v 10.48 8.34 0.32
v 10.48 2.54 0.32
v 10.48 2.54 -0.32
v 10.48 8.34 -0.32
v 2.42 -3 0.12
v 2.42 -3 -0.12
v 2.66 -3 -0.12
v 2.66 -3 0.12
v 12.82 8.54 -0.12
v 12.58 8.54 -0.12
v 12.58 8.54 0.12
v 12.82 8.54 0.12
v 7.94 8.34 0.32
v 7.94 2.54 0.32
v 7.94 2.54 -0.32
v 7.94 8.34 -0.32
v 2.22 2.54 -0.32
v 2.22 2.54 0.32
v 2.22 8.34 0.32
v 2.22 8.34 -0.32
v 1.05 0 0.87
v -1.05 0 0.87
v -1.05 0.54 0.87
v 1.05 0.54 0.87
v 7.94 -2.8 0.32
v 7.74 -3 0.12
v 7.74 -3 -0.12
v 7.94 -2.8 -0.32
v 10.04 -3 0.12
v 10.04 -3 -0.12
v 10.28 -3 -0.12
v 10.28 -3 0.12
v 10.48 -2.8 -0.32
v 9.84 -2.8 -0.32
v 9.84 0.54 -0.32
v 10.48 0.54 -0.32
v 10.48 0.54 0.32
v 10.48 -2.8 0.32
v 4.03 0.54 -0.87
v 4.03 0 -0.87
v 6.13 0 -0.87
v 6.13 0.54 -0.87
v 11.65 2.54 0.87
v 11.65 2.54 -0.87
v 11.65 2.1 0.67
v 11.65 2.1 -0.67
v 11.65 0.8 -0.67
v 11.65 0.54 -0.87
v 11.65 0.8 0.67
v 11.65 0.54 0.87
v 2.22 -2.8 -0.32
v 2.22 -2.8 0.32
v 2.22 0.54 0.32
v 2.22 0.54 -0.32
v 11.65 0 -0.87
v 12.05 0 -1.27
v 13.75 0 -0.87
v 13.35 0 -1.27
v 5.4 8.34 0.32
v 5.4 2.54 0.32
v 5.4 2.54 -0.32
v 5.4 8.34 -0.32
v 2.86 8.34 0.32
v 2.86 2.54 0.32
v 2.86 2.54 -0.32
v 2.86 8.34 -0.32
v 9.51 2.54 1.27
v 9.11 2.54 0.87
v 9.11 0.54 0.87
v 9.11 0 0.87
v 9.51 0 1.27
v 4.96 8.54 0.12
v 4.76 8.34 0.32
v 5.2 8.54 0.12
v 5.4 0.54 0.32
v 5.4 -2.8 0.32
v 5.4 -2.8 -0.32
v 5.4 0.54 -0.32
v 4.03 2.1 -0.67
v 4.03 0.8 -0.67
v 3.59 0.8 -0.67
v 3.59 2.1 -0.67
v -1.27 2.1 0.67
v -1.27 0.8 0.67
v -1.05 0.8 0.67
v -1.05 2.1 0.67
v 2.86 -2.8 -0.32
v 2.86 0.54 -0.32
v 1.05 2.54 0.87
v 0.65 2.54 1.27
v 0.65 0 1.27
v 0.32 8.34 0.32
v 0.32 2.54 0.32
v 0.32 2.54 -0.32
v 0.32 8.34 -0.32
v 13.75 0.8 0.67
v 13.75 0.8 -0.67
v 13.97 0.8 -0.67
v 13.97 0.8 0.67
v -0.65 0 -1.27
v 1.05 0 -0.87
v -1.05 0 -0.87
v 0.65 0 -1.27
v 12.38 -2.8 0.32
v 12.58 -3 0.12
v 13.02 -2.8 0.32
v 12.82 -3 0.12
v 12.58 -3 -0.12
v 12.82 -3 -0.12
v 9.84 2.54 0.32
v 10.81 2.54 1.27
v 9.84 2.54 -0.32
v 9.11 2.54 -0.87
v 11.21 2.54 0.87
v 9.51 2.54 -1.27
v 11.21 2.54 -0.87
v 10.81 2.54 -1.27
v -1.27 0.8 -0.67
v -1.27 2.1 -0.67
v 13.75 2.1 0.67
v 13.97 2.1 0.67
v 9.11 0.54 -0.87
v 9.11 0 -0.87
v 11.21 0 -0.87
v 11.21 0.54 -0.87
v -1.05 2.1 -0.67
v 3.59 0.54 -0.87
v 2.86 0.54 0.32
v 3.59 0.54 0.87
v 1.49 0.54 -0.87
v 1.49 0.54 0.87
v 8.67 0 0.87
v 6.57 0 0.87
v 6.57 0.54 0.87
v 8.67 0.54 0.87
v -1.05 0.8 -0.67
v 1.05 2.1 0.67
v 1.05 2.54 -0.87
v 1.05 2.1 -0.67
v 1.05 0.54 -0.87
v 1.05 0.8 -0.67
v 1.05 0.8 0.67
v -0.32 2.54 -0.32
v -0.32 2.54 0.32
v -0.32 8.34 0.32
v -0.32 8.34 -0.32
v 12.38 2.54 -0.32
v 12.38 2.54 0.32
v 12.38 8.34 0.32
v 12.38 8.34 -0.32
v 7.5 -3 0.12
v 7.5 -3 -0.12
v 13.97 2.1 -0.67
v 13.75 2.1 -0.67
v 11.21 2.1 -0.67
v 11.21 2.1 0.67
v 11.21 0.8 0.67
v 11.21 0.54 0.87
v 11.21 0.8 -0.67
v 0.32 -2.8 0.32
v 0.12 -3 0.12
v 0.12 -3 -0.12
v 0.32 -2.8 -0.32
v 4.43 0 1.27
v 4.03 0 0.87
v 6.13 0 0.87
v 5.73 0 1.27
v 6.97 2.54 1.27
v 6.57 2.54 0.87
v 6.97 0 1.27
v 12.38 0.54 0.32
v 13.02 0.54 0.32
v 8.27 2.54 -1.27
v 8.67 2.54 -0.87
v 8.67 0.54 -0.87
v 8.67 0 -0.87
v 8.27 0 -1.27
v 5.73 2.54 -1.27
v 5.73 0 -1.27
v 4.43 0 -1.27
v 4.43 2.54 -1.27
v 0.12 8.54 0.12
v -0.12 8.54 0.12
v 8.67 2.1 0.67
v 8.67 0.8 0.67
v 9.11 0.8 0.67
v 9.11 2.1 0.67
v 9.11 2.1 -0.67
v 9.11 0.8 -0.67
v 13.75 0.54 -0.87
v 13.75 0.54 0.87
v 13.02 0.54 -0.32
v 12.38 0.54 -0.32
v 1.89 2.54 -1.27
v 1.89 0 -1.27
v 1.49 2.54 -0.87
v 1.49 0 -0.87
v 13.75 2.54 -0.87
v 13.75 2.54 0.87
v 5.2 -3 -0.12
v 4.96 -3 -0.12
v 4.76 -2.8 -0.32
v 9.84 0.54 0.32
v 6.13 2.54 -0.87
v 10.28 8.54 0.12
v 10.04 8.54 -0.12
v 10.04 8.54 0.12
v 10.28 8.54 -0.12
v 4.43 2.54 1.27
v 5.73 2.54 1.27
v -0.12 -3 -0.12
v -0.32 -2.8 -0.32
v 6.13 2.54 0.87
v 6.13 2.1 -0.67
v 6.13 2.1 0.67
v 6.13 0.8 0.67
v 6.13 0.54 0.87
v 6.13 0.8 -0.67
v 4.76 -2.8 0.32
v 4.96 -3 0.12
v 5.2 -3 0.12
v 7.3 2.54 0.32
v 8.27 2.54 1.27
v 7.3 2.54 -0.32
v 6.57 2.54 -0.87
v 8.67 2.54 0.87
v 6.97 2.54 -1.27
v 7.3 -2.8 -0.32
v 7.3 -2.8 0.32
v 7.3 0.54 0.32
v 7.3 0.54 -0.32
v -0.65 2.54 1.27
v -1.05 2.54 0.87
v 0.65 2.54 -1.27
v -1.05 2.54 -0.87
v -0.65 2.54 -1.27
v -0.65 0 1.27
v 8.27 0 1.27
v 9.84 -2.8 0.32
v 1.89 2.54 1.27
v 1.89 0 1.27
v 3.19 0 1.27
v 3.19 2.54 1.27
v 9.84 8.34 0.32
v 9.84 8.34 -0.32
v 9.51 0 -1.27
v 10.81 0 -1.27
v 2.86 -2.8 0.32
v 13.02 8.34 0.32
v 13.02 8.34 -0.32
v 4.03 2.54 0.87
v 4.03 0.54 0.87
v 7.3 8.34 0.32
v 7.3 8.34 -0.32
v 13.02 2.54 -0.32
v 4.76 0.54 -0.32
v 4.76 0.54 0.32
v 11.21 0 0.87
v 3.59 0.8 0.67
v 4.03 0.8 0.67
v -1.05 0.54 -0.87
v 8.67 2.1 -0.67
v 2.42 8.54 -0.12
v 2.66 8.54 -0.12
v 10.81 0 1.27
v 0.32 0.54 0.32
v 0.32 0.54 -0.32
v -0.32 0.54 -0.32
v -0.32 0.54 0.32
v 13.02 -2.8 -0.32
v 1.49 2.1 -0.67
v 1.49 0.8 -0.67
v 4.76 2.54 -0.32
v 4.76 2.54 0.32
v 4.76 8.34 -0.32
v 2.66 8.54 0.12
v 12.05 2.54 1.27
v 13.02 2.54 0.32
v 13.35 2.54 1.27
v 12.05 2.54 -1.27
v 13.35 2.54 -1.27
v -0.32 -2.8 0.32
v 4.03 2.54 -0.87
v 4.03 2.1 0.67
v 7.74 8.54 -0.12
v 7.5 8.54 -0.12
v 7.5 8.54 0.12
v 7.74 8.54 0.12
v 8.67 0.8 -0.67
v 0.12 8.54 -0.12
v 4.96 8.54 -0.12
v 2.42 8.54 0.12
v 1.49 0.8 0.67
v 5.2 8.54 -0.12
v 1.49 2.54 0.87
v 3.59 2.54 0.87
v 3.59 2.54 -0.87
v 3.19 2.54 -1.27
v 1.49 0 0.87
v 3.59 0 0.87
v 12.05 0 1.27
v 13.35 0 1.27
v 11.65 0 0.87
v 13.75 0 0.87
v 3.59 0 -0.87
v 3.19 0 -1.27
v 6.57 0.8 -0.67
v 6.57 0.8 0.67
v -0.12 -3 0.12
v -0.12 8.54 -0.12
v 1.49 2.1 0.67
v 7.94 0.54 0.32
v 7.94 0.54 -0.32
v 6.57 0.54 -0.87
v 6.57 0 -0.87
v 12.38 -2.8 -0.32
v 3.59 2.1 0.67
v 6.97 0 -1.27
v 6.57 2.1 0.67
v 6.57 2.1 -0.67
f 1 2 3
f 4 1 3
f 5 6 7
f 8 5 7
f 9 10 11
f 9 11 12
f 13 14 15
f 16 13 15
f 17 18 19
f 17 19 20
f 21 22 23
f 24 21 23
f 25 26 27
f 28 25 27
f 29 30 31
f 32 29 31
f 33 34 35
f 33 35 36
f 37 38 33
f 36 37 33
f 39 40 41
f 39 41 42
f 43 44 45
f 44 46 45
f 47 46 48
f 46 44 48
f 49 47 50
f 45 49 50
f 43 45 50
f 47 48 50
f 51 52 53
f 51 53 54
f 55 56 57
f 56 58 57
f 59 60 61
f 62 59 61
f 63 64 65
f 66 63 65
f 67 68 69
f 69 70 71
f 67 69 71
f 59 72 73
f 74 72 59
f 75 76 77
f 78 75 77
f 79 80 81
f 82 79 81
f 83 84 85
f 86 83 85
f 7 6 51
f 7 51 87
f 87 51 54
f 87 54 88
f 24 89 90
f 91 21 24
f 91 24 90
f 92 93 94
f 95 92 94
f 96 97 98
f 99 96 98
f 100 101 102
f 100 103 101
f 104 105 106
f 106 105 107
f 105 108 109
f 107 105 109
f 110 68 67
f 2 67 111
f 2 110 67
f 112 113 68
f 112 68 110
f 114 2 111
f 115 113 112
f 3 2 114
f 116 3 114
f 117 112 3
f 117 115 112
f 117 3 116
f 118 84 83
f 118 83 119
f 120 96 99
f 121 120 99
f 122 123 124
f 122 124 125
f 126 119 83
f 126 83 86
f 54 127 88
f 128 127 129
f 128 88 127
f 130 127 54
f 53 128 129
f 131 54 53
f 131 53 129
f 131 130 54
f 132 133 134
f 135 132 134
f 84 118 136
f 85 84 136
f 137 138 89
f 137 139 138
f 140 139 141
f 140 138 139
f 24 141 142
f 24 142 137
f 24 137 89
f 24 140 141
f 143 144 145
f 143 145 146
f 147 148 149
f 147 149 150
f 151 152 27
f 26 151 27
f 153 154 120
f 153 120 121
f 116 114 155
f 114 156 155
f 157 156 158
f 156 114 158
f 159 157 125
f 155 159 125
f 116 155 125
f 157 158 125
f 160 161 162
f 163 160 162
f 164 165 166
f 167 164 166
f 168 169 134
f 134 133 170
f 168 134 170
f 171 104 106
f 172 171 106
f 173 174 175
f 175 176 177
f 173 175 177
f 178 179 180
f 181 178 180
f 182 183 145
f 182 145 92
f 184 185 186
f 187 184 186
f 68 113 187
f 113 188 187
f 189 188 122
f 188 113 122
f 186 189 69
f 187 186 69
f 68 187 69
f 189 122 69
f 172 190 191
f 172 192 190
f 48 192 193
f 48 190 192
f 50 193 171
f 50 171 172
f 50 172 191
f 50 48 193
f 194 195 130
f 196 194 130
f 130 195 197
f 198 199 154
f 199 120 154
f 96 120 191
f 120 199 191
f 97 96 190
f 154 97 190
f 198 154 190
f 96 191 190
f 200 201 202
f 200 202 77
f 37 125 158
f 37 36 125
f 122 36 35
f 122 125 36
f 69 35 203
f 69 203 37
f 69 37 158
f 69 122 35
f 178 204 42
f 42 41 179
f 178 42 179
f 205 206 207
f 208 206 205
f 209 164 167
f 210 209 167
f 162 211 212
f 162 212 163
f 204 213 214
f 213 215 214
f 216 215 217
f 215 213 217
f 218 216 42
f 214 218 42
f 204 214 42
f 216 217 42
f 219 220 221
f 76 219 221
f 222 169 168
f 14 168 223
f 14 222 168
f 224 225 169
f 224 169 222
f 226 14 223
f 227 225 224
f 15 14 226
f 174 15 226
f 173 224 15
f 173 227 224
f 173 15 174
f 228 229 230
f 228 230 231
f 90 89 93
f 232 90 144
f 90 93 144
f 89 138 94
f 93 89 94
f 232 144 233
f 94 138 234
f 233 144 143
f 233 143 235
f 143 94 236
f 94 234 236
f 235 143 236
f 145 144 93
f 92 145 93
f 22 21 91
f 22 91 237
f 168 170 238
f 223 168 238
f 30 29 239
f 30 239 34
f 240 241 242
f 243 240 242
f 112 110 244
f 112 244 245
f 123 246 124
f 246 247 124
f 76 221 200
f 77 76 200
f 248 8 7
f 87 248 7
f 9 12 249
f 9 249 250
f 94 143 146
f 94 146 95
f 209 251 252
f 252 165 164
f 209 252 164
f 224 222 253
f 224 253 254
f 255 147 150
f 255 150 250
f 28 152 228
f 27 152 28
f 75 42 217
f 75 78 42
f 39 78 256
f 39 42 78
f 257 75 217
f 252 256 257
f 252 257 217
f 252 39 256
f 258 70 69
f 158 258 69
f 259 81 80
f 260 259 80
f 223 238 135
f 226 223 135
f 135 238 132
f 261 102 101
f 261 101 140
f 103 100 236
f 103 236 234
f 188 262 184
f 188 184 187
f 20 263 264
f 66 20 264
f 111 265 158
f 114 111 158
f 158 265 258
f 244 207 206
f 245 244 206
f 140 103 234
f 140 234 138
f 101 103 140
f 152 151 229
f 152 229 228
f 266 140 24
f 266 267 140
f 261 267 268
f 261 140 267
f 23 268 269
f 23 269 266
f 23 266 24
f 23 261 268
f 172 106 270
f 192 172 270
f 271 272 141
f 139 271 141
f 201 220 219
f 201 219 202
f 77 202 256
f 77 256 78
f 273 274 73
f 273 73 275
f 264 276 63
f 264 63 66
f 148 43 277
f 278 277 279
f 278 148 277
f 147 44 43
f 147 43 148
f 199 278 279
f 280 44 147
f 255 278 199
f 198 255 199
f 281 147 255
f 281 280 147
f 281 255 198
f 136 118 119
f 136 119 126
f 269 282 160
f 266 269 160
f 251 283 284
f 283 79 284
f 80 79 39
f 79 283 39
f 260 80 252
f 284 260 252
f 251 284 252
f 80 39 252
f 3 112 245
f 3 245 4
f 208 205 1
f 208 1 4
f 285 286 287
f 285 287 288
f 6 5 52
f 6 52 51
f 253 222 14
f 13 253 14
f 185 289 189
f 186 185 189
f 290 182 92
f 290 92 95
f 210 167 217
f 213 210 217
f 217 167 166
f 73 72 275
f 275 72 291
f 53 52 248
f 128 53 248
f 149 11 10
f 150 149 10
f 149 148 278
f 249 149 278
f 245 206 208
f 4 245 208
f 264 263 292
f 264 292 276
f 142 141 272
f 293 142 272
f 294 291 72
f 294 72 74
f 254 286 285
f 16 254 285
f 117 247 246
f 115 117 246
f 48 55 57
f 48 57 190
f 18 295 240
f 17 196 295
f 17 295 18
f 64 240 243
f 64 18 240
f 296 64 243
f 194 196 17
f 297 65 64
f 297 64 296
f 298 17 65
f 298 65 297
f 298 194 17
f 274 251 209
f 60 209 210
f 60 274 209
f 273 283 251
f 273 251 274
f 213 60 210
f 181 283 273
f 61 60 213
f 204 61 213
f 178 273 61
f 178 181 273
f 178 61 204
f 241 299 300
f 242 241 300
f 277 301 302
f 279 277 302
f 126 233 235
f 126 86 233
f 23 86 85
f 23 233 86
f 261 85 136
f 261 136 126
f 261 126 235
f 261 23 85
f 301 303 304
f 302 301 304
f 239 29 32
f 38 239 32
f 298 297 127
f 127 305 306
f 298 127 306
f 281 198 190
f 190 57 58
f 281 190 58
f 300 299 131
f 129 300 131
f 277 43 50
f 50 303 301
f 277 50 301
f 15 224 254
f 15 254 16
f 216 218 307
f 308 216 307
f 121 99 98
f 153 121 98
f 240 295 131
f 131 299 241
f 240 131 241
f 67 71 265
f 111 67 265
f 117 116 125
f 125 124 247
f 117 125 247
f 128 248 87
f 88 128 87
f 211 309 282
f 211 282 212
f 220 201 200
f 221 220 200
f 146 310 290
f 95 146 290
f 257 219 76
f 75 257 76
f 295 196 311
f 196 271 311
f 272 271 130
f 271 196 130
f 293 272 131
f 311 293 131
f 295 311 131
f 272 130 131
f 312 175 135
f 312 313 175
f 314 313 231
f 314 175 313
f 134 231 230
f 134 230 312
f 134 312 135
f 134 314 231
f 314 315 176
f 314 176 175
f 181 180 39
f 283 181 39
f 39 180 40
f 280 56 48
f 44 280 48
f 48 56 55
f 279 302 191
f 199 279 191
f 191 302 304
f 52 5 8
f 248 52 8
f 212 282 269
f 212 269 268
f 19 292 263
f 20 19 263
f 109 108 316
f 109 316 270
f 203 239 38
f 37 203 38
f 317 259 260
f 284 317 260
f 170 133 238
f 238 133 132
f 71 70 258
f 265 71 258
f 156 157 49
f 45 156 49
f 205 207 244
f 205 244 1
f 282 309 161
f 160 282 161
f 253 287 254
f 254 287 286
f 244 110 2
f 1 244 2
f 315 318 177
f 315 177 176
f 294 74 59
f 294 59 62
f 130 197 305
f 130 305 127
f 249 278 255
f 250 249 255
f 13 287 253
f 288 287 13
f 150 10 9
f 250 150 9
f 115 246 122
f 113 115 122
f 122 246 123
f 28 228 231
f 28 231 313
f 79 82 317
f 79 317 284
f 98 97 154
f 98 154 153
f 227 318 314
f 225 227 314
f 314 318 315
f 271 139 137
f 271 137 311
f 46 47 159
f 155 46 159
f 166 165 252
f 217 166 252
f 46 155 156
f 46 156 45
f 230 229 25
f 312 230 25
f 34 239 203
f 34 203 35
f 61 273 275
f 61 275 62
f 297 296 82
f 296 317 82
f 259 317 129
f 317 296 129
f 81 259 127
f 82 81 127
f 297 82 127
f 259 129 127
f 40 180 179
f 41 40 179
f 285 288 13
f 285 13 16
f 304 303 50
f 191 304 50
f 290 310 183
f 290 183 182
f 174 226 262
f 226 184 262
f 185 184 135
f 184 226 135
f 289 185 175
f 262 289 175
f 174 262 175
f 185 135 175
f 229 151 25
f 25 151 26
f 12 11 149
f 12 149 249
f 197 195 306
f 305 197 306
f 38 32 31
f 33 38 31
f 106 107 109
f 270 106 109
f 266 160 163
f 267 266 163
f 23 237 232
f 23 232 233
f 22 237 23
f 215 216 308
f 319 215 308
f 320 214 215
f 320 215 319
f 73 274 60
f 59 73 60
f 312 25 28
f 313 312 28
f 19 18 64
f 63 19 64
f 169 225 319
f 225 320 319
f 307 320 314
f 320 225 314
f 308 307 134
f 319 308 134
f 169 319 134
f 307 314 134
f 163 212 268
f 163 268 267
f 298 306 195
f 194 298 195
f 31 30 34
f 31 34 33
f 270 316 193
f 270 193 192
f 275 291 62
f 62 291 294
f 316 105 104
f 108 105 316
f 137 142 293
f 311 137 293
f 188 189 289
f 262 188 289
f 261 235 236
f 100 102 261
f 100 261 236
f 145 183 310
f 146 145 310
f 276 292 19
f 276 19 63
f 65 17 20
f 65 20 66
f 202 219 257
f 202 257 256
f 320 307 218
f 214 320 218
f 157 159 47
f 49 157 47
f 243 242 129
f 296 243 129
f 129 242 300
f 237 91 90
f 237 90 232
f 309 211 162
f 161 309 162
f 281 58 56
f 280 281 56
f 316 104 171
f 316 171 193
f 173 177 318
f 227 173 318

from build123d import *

# Parameters (mm, degrees)
EXTRUDE_2_DEPTH                    = 2.54
EXTRUDE_2_2_DEPTH                  = 2.54
EXTRUDE_2_3_DEPTH                  = 2.54
EXTRUDE_2_4_DEPTH                  = 2.54
EXTRUDE_2_5_DEPTH                  = 2.54
EXTRUDE_2_6_DEPTH                  = 2.54
EXTRUDE_START                      = 0.8
SKETCH_3_W                         = 0.22
SKETCH_3_H                         = 1.34
EXTRUDE_3_DEPTH                    = 1.3
SKETCH_4_W                         = 1.74
SKETCH_4_H                         = 0.54
CUT_EXTRUDE_1_DEPTH                = 16.28610153
EXTRUDE_START_2                    = -3
SKETCH_5_W                         = 0.64
SKETCH_5_H                         = 0.64
EXTRUDE_4_DEPTH                    = 11.54
CHAMFER_1_SIZE                     = 0.2
CHAMFER_2_SIZE                     = 0.2
PATTERN_LINEAR_1_COUNT             = 6
PATTERN_LINEAR_1_PITCH             = 2.54
CHAMFER_1_OF_PATTERN_LINEAR_1_SIZE = 0.2
CHAMFER_2_OF_PATTERN_LINEAR_1_SIZE = 0.2


with BuildPart() as part:
    # Эскиз2 → Бобышка-Вытянуть2 (new body)
    with BuildSketch(Plane(origin=(0, 0, 0), x_dir=(1, 0, 0), z_dir=(0, 1, 0))):
        Polygon((-1.05, 0.87), (-0.65, 1.27), (0.65, 1.27), (1.05, 0.87), (1.05, -0.87), (0.65, -1.27), (-0.65, -1.27), (-1.05, -0.87), align=None)
    extrude(amount=EXTRUDE_2_DEPTH)



with BuildPart() as body_2:
    # Эскиз2 → Extrude 2 2 (new body)
    with BuildSketch(Plane(origin=(0, 0, 0), x_dir=(1, 0, 0), z_dir=(0, 1, 0))):
        Polygon((1.89, -1.27), (3.19, -1.27), (3.59, -0.87), (3.59, 0.87), (3.19, 1.27), (1.89, 1.27), (1.49, 0.87), (1.49, -0.87), align=None)
    extrude(amount=EXTRUDE_2_2_DEPTH)


with BuildPart() as body_3:
    # Эскиз2 → Extrude 2 3 (new body)
    with BuildSketch(Plane(origin=(0, 0, 0), x_dir=(1, 0, 0), z_dir=(0, 1, 0))):
        Polygon((4.43, -1.27), (5.73, -1.27), (6.13, -0.87), (6.13, 0.87), (5.73, 1.27), (4.43, 1.27), (4.03, 0.87), (4.03, -0.87), align=None)
    extrude(amount=EXTRUDE_2_3_DEPTH)


with BuildPart() as body_4:
    # Эскиз2 → Extrude 2 4 (new body)
    with BuildSketch(Plane(origin=(0, 0, 0), x_dir=(1, 0, 0), z_dir=(0, 1, 0))):
        Polygon((6.97, -1.27), (8.27, -1.27), (8.67, -0.87), (8.67, 0.87), (8.27, 1.27), (6.97, 1.27), (6.57, 0.87), (6.57, -0.87), align=None)
    extrude(amount=EXTRUDE_2_4_DEPTH)


with BuildPart() as body_5:
    # Эскиз2 → Extrude 2 5 (new body)
    with BuildSketch(Plane(origin=(0, 0, 0), x_dir=(1, 0, 0), z_dir=(0, 1, 0))):
        Polygon((9.51, -1.27), (10.81, -1.27), (11.21, -0.87), (11.21, 0.87), (10.81, 1.27), (9.51, 1.27), (9.11, 0.87), (9.11, -0.87), align=None)
    extrude(amount=EXTRUDE_2_5_DEPTH)


with BuildPart() as body_6:
    # Эскиз2 → Extrude 2 6 (new body)
    with BuildSketch(Plane(origin=(0, 0, 0), x_dir=(1, 0, 0), z_dir=(0, 1, 0))):
        Polygon((12.05, -1.27), (13.35, -1.27), (13.75, -0.87), (13.75, 0.87), (13.35, 1.27), (12.05, 1.27), (11.65, 0.87), (11.65, -0.87), align=None)
    extrude(amount=EXTRUDE_2_6_DEPTH)


with BuildPart() as part_1:
    add(part.part)

    add(body_2.part)  # Бобышка-Вытянуть3 merges body 2

    add(body_3.part)  # Бобышка-Вытянуть3 merges body 3

    add(body_4.part)  # Бобышка-Вытянуть3 merges body 4

    add(body_5.part)  # Бобышка-Вытянуть3 merges body 5

    add(body_6.part)  # Бобышка-Вытянуть3 merges body 6
    # Эскиз3 → Бобышка-Вытянуть3 (add)
    with BuildSketch(Plane(origin=(0, 0, 0), x_dir=(1, 0, 0), z_dir=(0, 1, 0)).offset(EXTRUDE_START)):
        with Locations((-1.16, 0)):
            Rectangle(SKETCH_3_W, SKETCH_3_H)
        with Locations((1.16, 0)):
            Rectangle(SKETCH_3_W, SKETCH_3_H)
        with Locations((1.38, 0)):
            Rectangle(SKETCH_3_W, SKETCH_3_H)
        with Locations((3.7, 0)):
            Rectangle(SKETCH_3_W, SKETCH_3_H)
        with Locations((3.92, 0)):
            Rectangle(SKETCH_3_W, SKETCH_3_H)
        with Locations((6.24, 0)):
            Rectangle(SKETCH_3_W, SKETCH_3_H)
        with Locations((6.46, 0)):
            Rectangle(SKETCH_3_W, SKETCH_3_H)
        with Locations((8.78, 0)):
            Rectangle(SKETCH_3_W, SKETCH_3_H)
        with Locations((11.32, 0)):
            Rectangle(SKETCH_3_W, SKETCH_3_H)
        with Locations((11.54, 0)):
            Rectangle(SKETCH_3_W, SKETCH_3_H)
        with Locations((9, 0)):
            Rectangle(SKETCH_3_W, SKETCH_3_H)
        with Locations((13.86, 0)):
            Rectangle(SKETCH_3_W, SKETCH_3_H)
    extrude(amount=EXTRUDE_3_DEPTH)

    # Эскиз4 → Вырез-Вытянуть1 (cut, through all)
    with BuildSketch(Plane.ZY.offset(1.05)):
        with Locations((0, 0.27)):
            Rectangle(SKETCH_4_W, SKETCH_4_H)
    extrude(amount=-CUT_EXTRUDE_1_DEPTH, mode=Mode.SUBTRACT)

    # Эскиз5 → Бобышка-Вытянуть4 (add)
    with BuildSketch(Plane(origin=(0, 0, 0), x_dir=(1, 0, 0), z_dir=(0, 1, 0)).offset(EXTRUDE_START_2)):
        Rectangle(SKETCH_5_W, SKETCH_5_H)
    extrude_4 = extrude(amount=EXTRUDE_4_DEPTH)

    # Фаска1
    chamfer_1_edges = [part_1.edges().sort_by_distance(p)[0] for p in [
        (0.32, 8.54, 0),
        (0, 8.54, -0.32),
        (-0.32, 8.54, 0),
        (0, 8.54, 0.32),
    ]]
    chamfer(chamfer_1_edges, length=CHAMFER_1_SIZE)

    # Фаска2
    chamfer_2_edges = [part_1.edges().sort_by_distance(p)[0] for p in [
        (0.32, -3, 0),
        (0, -3, 0.32),
        (-0.32, -3, 0),
        (0, -3, -0.32),
    ]]
    chamfer(chamfer_2_edges, length=CHAMFER_2_SIZE)

    # Линейный массив1: Бобышка-Вытянуть4 ×6
    with Locations(*[(i * PATTERN_LINEAR_1_PITCH, 0, 0) for i in range(1, PATTERN_LINEAR_1_COUNT)]):
        add(extrude_4)

    # Фаска1 of Линейный массив1
    chamfer_1_of_pattern_linear_1_edges = [part_1.edges().sort_by_distance(p)[0] for p in [
        (2.86, 8.54, 0),
        (2.54, 8.54, -0.32),
        (2.22, 8.54, 0),
        (2.54, 8.54, 0.32),
        (5.4, 8.54, 0),
        (5.08, 8.54, -0.32),
        (4.76, 8.54, 0),
        (5.08, 8.54, 0.32),
        (7.94, 8.54, 0),
        (7.62, 8.54, -0.32),
        (7.3, 8.54, 0),
        (7.62, 8.54, 0.32),
        (10.48, 8.54, 0),
        (10.16, 8.54, -0.32),
        (9.84, 8.54, 0),
        (10.16, 8.54, 0.32),
        (13.02, 8.54, 0),
        (12.7, 8.54, -0.32),
        (12.38, 8.54, 0),
        (12.7, 8.54, 0.32),
    ]]
    chamfer(chamfer_1_of_pattern_linear_1_edges, length=CHAMFER_1_OF_PATTERN_LINEAR_1_SIZE)

    # Фаска2 of Линейный массив1
    chamfer_2_of_pattern_linear_1_edges = [part_1.edges().sort_by_distance(p)[0] for p in [
        (2.86, -3, 0),
        (2.54, -3, 0.32),
        (2.22, -3, 0),
        (2.54, -3, -0.32),
        (5.4, -3, 0),
        (5.08, -3, 0.32),
        (4.76, -3, 0),
        (5.08, -3, -0.32),
        (7.94, -3, 0),
        (7.62, -3, 0.32),
        (7.3, -3, 0),
        (7.62, -3, -0.32),
        (10.48, -3, 0),
        (10.16, -3, 0.32),
        (9.84, -3, 0),
        (10.16, -3, -0.32),
        (13.02, -3, 0),
        (12.7, -3, 0.32),
        (12.38, -3, 0),
        (12.7, -3, -0.32),
    ]]
    chamfer(chamfer_2_of_pattern_linear_1_edges, length=CHAMFER_2_OF_PATTERN_LINEAR_1_SIZE)


solid = part_1.part
